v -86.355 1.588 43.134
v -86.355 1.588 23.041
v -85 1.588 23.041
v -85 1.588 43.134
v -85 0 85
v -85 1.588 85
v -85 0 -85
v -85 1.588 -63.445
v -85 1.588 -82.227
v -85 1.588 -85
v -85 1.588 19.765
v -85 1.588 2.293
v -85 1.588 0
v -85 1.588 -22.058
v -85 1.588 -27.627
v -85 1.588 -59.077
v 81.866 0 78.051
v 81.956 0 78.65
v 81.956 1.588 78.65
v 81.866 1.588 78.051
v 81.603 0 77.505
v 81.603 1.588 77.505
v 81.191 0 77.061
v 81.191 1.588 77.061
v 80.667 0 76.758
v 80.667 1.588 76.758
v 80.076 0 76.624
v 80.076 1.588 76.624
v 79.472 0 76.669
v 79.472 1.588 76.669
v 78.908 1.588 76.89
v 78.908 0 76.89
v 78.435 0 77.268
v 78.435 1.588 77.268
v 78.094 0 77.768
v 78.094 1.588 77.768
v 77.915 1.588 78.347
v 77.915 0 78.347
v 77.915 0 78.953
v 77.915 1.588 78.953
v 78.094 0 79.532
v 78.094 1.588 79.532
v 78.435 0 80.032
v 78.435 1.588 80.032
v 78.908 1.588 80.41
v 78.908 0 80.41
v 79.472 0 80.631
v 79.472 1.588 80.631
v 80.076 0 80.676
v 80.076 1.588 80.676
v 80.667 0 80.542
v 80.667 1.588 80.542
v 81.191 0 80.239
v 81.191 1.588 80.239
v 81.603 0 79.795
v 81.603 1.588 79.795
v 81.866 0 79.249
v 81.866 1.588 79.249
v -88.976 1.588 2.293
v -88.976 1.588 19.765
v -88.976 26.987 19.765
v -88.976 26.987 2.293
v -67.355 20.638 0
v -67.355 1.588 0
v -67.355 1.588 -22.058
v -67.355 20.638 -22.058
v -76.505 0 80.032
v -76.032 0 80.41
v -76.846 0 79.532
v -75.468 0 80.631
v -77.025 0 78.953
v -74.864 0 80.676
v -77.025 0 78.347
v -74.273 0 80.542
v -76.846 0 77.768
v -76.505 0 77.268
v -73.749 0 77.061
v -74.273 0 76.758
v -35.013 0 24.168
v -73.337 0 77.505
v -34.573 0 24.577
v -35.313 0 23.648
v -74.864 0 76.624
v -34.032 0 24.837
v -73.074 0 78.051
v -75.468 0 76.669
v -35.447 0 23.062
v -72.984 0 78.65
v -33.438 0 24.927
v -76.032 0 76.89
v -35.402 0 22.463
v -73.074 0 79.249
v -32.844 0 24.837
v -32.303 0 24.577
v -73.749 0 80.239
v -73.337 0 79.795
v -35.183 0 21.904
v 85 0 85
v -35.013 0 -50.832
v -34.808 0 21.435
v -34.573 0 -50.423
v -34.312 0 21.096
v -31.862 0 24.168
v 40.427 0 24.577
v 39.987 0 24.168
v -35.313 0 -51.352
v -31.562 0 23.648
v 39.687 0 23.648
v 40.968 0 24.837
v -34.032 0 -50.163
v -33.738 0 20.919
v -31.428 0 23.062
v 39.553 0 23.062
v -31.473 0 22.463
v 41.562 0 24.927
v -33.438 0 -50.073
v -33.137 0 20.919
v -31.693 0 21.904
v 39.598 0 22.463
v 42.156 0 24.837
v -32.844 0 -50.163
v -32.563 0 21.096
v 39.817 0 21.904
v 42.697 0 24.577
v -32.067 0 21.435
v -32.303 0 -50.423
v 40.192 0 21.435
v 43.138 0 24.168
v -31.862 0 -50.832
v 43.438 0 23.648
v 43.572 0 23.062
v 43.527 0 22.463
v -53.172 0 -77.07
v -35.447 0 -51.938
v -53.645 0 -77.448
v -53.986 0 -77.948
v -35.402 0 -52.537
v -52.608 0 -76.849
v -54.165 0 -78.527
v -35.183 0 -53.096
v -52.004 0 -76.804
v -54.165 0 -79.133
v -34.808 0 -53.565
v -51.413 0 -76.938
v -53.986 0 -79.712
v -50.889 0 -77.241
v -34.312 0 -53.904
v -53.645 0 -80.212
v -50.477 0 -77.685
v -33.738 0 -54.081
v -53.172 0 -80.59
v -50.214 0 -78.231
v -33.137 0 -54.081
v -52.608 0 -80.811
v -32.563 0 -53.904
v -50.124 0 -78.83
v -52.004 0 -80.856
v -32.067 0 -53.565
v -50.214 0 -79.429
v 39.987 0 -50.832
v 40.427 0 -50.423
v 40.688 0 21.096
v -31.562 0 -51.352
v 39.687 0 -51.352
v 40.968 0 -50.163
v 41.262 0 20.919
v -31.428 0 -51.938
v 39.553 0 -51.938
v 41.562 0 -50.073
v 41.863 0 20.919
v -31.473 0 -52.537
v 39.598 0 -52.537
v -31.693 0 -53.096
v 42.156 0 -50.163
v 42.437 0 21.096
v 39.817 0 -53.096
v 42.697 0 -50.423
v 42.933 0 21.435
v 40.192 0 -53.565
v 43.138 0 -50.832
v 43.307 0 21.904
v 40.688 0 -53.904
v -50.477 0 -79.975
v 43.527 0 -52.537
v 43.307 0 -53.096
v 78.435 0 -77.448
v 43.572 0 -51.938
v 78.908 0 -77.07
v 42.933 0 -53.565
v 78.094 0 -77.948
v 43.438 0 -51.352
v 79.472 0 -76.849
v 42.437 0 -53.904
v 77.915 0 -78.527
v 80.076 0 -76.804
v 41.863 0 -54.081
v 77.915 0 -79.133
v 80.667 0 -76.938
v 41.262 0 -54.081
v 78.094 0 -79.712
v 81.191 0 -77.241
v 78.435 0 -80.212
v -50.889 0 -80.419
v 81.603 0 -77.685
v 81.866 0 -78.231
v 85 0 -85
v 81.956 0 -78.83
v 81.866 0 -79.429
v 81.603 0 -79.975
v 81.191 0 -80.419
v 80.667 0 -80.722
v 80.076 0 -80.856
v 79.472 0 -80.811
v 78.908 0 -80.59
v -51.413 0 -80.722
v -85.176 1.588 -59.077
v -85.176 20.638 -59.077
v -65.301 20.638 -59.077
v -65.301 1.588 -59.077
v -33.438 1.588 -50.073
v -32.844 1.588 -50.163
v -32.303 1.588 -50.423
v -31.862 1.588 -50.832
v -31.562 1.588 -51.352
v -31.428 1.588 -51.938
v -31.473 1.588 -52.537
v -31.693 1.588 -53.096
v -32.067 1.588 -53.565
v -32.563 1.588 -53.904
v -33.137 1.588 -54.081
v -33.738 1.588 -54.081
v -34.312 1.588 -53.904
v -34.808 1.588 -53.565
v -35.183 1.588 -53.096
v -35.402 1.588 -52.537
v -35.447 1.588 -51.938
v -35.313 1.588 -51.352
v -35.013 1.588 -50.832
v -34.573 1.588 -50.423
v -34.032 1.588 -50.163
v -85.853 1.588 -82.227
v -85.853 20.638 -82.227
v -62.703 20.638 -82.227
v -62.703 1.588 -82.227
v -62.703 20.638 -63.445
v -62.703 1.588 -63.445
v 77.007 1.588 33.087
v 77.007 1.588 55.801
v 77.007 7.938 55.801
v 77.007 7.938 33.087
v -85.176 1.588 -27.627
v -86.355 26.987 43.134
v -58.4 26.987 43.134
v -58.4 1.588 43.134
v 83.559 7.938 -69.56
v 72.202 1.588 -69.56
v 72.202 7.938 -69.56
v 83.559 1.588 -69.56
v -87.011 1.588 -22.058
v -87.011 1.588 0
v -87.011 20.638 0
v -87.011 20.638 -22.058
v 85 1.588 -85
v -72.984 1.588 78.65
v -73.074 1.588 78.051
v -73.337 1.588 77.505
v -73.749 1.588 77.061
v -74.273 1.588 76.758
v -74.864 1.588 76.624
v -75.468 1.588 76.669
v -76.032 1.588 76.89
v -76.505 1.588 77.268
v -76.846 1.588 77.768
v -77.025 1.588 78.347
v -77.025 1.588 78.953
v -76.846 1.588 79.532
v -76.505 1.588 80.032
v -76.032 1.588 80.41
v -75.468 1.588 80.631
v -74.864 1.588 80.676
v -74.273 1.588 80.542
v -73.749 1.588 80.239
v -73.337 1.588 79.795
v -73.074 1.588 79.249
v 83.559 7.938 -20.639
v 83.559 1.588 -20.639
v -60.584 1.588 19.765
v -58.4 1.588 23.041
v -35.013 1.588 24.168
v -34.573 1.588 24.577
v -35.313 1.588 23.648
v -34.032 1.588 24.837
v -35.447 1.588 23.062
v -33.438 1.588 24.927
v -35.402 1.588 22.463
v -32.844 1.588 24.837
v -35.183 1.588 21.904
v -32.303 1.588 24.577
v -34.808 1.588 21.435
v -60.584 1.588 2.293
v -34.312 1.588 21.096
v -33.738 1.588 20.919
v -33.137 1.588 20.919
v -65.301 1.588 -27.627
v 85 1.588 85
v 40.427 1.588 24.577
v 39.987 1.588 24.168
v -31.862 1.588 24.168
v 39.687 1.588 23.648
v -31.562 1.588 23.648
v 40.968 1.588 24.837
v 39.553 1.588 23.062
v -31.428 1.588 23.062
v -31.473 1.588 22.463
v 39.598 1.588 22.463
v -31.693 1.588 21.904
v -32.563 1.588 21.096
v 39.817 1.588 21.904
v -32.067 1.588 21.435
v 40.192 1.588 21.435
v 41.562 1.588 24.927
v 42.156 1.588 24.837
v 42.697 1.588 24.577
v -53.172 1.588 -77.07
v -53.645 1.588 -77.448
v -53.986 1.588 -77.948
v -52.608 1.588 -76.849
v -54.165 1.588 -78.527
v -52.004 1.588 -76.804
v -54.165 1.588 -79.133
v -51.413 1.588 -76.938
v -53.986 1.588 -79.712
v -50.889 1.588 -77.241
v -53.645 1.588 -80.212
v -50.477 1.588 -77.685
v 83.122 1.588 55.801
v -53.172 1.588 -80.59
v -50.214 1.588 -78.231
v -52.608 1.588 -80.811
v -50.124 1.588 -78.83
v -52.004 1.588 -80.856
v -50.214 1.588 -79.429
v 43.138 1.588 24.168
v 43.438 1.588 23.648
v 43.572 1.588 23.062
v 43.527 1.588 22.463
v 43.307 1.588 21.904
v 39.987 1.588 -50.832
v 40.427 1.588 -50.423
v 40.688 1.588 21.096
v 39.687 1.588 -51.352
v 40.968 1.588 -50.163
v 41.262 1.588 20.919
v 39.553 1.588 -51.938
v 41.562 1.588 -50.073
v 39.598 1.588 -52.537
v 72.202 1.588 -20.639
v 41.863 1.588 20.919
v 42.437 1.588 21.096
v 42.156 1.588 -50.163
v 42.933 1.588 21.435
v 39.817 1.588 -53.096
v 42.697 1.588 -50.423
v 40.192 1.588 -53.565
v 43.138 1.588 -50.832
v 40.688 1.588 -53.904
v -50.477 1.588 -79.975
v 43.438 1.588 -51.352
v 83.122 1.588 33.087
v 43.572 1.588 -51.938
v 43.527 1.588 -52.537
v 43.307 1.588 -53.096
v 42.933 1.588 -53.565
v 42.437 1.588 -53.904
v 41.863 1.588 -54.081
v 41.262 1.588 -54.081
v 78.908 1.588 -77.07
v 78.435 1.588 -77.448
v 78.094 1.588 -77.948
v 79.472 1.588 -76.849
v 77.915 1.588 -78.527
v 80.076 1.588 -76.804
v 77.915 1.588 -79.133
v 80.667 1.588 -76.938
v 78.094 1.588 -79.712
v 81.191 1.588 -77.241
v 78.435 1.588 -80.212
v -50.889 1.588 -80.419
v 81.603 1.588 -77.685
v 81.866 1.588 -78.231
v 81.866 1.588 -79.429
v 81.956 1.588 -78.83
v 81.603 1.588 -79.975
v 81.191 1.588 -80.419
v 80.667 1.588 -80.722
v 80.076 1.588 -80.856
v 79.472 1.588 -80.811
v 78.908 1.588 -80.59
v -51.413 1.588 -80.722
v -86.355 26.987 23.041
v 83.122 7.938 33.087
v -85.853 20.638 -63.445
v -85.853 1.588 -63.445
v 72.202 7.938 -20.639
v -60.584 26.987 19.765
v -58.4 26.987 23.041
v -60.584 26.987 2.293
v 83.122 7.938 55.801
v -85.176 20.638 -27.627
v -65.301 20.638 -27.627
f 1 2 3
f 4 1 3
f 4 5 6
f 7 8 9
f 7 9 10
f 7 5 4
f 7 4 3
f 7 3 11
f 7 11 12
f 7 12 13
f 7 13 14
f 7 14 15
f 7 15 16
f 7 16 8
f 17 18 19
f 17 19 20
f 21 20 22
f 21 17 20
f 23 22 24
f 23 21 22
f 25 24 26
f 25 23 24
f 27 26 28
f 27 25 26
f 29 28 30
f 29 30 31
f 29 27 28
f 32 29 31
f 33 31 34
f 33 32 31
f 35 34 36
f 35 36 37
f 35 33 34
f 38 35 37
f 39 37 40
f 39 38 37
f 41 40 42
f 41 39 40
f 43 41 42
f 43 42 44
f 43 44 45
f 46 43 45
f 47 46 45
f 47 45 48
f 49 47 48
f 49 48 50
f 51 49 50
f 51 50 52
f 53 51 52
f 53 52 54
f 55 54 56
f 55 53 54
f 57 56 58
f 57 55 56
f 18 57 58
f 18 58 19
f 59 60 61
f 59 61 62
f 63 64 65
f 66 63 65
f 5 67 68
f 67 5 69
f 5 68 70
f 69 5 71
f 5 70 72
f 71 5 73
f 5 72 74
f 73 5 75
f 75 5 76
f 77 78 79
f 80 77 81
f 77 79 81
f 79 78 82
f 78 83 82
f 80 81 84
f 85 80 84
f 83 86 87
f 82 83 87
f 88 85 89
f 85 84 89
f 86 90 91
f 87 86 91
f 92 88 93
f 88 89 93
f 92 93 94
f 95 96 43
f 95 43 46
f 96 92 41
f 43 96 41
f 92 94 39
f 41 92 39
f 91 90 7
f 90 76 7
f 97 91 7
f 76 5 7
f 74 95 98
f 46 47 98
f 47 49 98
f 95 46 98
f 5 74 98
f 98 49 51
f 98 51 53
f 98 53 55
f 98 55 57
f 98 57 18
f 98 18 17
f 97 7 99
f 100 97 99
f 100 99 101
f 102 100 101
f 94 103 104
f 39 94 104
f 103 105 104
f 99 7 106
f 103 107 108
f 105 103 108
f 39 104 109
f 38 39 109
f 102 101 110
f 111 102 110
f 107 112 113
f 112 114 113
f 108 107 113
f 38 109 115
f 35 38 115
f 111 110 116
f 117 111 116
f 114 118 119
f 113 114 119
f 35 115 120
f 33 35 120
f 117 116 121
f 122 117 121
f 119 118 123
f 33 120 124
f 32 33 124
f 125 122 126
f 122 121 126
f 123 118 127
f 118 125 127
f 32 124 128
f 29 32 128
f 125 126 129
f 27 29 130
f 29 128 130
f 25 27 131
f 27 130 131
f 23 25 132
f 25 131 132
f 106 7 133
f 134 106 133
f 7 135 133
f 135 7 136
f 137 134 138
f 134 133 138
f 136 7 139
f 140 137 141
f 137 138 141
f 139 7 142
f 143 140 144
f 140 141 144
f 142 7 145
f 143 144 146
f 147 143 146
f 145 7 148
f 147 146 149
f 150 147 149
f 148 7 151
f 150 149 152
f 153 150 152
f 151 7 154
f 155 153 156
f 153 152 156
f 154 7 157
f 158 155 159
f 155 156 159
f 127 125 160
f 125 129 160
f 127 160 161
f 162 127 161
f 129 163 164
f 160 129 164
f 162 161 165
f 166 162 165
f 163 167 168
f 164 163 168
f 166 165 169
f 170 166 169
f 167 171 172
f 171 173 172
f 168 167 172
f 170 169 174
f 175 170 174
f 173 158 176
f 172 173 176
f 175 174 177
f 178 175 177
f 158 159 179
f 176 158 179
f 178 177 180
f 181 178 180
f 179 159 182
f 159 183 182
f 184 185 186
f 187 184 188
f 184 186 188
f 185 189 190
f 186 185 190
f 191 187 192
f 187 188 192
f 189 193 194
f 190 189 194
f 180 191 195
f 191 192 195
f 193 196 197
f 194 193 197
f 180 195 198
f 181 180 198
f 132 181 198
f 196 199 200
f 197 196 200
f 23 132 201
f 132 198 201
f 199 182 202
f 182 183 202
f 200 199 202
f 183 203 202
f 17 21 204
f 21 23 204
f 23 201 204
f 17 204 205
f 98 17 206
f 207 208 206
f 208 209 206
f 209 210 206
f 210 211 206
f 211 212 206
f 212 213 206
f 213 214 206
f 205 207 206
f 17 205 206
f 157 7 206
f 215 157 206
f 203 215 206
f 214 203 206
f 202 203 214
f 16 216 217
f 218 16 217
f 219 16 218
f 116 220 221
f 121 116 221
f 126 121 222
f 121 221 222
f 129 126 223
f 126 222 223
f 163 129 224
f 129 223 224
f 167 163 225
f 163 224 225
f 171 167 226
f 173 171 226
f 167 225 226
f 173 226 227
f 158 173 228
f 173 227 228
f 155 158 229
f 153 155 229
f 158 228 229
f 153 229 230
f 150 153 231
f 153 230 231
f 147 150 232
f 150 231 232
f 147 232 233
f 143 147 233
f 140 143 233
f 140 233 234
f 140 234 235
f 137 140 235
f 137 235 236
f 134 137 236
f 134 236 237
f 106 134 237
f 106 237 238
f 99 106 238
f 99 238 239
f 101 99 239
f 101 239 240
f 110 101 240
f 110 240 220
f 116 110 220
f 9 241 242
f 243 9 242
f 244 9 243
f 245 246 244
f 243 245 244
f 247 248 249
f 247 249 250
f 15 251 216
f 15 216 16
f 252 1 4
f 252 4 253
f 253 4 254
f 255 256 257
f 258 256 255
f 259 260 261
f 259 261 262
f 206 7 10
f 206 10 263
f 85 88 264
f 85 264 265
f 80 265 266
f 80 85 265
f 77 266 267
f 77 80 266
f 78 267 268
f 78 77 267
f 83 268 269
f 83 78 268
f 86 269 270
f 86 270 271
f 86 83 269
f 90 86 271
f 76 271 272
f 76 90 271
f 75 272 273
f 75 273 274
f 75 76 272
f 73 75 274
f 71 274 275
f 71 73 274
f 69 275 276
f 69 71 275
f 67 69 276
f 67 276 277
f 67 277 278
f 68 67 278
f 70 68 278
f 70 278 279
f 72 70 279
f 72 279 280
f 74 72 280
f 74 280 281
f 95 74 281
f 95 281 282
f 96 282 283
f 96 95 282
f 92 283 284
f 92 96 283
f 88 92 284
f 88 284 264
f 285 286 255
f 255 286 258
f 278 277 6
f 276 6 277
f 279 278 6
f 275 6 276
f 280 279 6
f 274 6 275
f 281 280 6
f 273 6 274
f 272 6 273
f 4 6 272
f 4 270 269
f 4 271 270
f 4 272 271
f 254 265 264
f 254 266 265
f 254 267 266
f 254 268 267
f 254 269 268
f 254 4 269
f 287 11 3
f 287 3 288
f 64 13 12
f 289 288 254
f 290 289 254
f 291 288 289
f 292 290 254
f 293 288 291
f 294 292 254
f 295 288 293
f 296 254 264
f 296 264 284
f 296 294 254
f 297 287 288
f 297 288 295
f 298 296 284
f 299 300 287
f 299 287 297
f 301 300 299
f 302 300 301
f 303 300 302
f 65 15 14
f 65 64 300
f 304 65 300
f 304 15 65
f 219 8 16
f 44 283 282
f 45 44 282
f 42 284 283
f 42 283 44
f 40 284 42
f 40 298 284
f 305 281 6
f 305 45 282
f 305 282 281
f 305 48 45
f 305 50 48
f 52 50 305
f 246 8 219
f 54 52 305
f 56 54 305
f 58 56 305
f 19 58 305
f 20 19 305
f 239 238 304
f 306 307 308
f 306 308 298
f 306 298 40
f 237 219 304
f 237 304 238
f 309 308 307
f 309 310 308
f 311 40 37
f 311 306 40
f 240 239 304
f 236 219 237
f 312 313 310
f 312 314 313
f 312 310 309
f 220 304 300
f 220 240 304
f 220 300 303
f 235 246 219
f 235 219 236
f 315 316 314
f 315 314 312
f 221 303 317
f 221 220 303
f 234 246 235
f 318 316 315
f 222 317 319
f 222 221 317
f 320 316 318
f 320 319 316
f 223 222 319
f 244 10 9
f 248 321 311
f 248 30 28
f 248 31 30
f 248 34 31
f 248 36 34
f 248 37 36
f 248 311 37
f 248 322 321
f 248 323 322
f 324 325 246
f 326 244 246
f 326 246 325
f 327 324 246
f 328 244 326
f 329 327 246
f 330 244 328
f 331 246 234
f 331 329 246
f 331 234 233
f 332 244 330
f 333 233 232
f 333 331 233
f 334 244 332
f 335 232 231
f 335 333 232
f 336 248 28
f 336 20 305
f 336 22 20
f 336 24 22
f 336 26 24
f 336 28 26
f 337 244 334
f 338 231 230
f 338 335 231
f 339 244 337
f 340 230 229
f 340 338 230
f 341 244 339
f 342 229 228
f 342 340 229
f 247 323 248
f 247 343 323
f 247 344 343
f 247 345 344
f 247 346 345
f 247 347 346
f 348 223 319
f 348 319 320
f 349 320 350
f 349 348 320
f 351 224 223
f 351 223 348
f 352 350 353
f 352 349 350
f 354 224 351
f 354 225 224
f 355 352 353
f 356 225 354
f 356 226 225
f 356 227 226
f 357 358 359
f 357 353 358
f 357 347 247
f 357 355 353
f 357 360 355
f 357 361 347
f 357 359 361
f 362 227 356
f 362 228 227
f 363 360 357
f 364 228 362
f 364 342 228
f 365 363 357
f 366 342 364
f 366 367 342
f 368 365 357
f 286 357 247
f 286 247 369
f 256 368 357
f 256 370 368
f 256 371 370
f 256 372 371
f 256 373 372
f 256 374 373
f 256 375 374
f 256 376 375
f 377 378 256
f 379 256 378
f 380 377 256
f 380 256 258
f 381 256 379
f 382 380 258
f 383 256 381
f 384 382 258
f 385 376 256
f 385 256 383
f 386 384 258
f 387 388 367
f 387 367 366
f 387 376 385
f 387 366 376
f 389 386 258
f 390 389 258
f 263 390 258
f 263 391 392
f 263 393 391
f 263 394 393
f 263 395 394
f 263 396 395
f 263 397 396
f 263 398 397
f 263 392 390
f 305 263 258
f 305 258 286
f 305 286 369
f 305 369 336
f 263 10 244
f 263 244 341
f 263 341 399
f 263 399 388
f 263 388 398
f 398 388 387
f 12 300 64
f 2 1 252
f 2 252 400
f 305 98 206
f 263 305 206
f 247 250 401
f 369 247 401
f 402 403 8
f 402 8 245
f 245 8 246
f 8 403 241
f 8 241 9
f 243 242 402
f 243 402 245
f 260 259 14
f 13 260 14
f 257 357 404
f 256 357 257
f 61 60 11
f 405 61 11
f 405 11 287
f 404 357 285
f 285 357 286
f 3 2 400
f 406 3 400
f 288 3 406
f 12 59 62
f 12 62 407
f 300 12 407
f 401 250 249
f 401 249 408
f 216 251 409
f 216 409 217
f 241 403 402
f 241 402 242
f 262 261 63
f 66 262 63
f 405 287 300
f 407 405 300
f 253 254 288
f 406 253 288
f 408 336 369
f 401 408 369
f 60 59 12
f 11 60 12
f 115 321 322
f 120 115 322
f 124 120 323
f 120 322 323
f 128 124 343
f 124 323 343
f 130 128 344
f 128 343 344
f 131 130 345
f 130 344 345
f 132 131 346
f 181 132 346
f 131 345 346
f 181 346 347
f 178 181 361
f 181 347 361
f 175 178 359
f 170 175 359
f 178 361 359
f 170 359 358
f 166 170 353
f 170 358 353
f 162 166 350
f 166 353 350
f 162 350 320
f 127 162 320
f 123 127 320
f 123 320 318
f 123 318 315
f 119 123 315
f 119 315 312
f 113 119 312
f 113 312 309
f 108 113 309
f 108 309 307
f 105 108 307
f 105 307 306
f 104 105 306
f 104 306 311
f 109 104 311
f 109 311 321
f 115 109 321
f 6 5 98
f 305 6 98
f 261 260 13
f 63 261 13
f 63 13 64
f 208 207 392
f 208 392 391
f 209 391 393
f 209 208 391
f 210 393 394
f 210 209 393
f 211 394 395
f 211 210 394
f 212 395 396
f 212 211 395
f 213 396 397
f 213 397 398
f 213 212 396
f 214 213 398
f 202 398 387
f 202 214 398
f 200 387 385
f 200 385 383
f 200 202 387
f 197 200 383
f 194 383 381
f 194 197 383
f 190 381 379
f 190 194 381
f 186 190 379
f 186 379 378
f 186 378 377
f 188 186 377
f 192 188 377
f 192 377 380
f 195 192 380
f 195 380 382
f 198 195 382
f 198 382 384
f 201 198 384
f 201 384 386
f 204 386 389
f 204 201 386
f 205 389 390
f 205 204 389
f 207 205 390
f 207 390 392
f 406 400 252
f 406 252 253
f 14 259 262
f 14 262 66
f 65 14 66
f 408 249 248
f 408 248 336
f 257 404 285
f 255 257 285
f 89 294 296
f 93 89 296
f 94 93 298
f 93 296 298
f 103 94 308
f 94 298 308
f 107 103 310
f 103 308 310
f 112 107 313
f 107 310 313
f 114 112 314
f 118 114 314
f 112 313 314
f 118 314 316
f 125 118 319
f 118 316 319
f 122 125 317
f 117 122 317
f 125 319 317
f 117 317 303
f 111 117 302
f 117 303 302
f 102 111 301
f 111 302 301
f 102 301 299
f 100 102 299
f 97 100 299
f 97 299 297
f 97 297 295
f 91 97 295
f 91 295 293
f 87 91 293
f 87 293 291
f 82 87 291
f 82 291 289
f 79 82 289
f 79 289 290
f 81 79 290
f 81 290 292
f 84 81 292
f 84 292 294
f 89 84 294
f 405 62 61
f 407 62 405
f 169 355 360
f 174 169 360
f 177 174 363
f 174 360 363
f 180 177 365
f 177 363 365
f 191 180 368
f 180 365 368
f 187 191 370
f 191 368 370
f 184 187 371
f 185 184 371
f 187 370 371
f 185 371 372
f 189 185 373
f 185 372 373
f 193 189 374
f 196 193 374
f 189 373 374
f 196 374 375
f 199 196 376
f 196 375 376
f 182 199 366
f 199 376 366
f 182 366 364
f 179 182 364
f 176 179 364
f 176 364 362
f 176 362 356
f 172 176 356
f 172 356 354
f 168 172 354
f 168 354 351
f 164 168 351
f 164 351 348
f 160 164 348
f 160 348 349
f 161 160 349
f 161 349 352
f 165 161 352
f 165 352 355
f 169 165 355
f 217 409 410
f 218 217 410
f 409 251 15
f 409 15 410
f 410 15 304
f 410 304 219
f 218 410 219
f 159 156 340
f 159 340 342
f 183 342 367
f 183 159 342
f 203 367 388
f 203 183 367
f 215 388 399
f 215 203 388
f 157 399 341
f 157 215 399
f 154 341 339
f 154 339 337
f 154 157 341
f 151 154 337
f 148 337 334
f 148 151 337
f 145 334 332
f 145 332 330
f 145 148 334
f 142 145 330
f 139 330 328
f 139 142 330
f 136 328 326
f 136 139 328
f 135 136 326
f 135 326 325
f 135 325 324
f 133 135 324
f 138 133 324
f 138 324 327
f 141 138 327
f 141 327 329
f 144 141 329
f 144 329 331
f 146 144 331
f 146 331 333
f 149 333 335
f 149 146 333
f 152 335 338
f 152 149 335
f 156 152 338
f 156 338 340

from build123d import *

# Parameters (mm, degrees)
SKETCH1_W                     = 170
SKETCH1_H                     = 170
BOSS_EXTRUDE1_DEPTH           = 1.5875
SKETCH2_W                     = 19.874317931
SKETCH2_H                     = 31.449470131
VGA_DEPTH                     = 19.05
SKETCH3_W                     = 19.655918832
SKETCH3_H                     = 22.058308912
HDMI_DEPTH                    = 19.05
SKETCH4_W                     = 28.391882757
SKETCH4_H                     = 17.471927851
USB_1_DEPTH                   = 25.4
SKETCH5_W                     = 27.955084562
SKETCH5_H                     = 20.092717029
ETH_USB_2_DEPTH               = 25.4
SKETCH6_W                     = 6.115174748
SKETCH6_H                     = 22.713506206
FRONT_USB_3_HEADER_DEPTH      = 6.35
SKETCH7_W                     = 11.356753103
SKETCH7_H                     = 48.921397982
ATX_DEPTH                     = 6.35
SKETCH8_W                     = 23.150304402
SKETCH8_H                     = 18.78232244
USB_MOUSE_DEPTH               = 19.05
SKETCH9_R                     = 2.015
LGA_1150_MOUNTING_HOLES_DEPTH = 126.64606768
MAIN_MOUNTING_HOLES_OUTLINE_R = 2.032
MAIN_MOUNTING_HOLES_DEPTH     = 1.5875


# Read off the part's stored shape, not the designer's step: Main Mounting holes
with BuildPart() as part:
    # Sketch1 → Boss-Extrude1 (new body)
    with BuildSketch(Plane(origin=(0, 0, 0), x_dir=(1, 0, 0), z_dir=(0, 1, 0))):
        Rectangle(SKETCH1_W, SKETCH1_H)
    extrude(amount=BOSS_EXTRUDE1_DEPTH)

    # Sketch2 → VGA (add)
    with BuildSketch(Plane(origin=(0, 1.5875, 0), x_dir=(1, 0, 0), z_dir=(0, 1, 0))):
        with Locations((-75.238489308, 43.35222098)):
            Rectangle(SKETCH2_W, SKETCH2_H)
    extrude(amount=VGA_DEPTH)

    # Sketch3 → HDMI (add)
    with BuildSketch(Plane(origin=(0, 1.5875, 0), x_dir=(1, 0, 0), z_dir=(0, 1, 0))):
        with Locations((-77.182705778, 11.029154456)):
            Rectangle(SKETCH3_W, SKETCH3_H)
    extrude(amount=HDMI_DEPTH)

    # Sketch4 → USB_1 (add)
    with BuildSketch(Plane(origin=(0, 1.5875, 0), x_dir=(1, 0, 0), z_dir=(0, 1, 0))):
        with Locations((-74.780315699, -11.029154456)):
            Rectangle(SKETCH4_W, SKETCH4_H)
    extrude(amount=USB_1_DEPTH)

    # Sketch5 → ETH_USB_2 (add)
    with BuildSketch(Plane(origin=(0, 1.5875, 0), x_dir=(1, 0, 0), z_dir=(0, 1, 0))):
        with Locations((-72.377925619, -33.087463367)):
            Rectangle(SKETCH5_W, SKETCH5_H)
    extrude(amount=ETH_USB_2_DEPTH)

    # Sketch6 → Front USB 3 Header (add)
    with BuildSketch(Plane(origin=(0, 1.5875, 0), x_dir=(1, 0, 0), z_dir=(0, 1, 0))):
        with Locations((80.064644879, -44.44421647)):
            Rectangle(SKETCH6_W, SKETCH6_H)
    extrude(amount=FRONT_USB_3_HEADER_DEPTH)

    # Sketch7 → ATX (add)
    with BuildSketch(Plane(origin=(0, 1.5875, 0), x_dir=(1, 0, 0), z_dir=(0, 1, 0))):
        with Locations((77.880653897, 45.099413765)):
            Rectangle(SKETCH7_W, SKETCH7_H)
    extrude(amount=ATX_DEPTH)

    # Sketch8 → USB_MOUSE (add)
    with BuildSketch(Plane(origin=(0, 1.5875, 0), x_dir=(1, 0, 0), z_dir=(0, 1, 0))):
        with Locations((-74.278230021, 72.836099228)):
            Rectangle(SKETCH8_W, SKETCH8_H)
    extrude(amount=USB_MOUSE_DEPTH)

    # Sketch9 → LGA 1150 Mounting holes (cut, through all)
    with BuildSketch(Plane(origin=(0, 1.5875, 0), x_dir=(1, 0, 0), z_dir=(0, 1, 0))):
        with Locations(Location((-33.43759867, 52.088184905, 0), (0, 0, 270))):
            Circle(SKETCH9_R)
        with Locations(Location((41.56240133, 52.088184905, 0), (0, 0, 270))):
            Circle(SKETCH9_R)
        with Locations(Location((41.56240133, -22.911815095, 0), (0, 0, 270))):
            Circle(SKETCH9_R)
        with Locations(Location((-33.43759867, -22.911815095, 0), (0, 0, 270))):
            Circle(SKETCH9_R)
    extrude(amount=-LGA_1150_MOUNTING_HOLES_DEPTH, mode=Mode.SUBTRACT)

    # Main Mounting holes outline → Main Mounting holes (cut)
    with BuildSketch(Plane(origin=(0, 0, 0), x_dir=(1, 0, 0), z_dir=(0, 1, 0))):
        with Locations((79.924351727, 78.83)):
            Circle(MAIN_MOUNTING_HOLES_OUTLINE_R)
        with Locations((79.924351727, -78.65)):
            Circle(MAIN_MOUNTING_HOLES_OUTLINE_R)
        with Locations((-75.015648273, -78.65)):
            Circle(MAIN_MOUNTING_HOLES_OUTLINE_R)
        with Locations((-52.155648273, 78.83)):
            Circle(MAIN_MOUNTING_HOLES_OUTLINE_R)
    extrude(amount=MAIN_MOUNTING_HOLES_DEPTH, mode=Mode.SUBTRACT)


solid = part.part
